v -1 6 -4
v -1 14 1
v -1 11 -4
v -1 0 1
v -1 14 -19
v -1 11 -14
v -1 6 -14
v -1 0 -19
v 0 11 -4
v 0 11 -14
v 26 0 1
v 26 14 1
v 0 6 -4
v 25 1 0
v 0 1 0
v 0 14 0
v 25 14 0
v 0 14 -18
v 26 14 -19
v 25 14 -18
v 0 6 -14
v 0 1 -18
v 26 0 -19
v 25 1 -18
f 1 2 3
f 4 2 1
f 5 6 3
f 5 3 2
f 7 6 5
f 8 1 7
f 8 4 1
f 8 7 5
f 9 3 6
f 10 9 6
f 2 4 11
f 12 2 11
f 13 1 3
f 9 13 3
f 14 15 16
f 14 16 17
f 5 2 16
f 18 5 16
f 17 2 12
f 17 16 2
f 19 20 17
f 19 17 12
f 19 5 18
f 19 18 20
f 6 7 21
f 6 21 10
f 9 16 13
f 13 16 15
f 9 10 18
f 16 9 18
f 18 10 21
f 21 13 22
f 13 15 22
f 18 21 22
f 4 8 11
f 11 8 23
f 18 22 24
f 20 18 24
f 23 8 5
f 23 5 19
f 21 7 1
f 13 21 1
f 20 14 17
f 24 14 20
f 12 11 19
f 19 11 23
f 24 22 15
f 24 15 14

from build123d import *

# Parameters (mm, degrees)
CROQUIS1_W              = 27
CROQUIS1_H              = 20
CROQUIS1_W_2            = 25
CROQUIS1_H_2            = 18
SALIENTE_EXTRUIR1_DEPTH = 14
CROQUIS1_3_W            = 25
CROQUIS1_3_H            = 18
SALIENTE_EXTRUIR2_DEPTH = 1
CROQUIS2_W              = 10
CROQUIS2_H              = 5
CORTAR_EXTRUIR1_DEPTH   = 1


with BuildPart() as part:
    # Croquis1 → Saliente-Extruir1 (new body)
    with BuildSketch(Plane(origin=(0, 0, 0), x_dir=(1, 0, 0), z_dir=(0, 1, 0))):
        with Locations((12.5, 9)):
            Rectangle(CROQUIS1_W, CROQUIS1_H)
        with Locations((12.5, 9)):
            Rectangle(CROQUIS1_W_2, CROQUIS1_H_2, mode=Mode.SUBTRACT)
    extrude(amount=SALIENTE_EXTRUIR1_DEPTH)

    # Croquis1<3> → Saliente-Extruir2 (add)
    with BuildSketch(Plane(origin=(0, 0, 0), x_dir=(1, 0, 0), z_dir=(0, 1, 0))):
        with Locations((12.5, 9)):
            Rectangle(CROQUIS1_3_W, CROQUIS1_3_H)
    extrude(amount=SALIENTE_EXTRUIR2_DEPTH)

    # Croquis2 → Cortar-Extruir1 (cut)
    with BuildSketch(Plane.ZY.offset(1)):
        with Locations((-9, 8.5)):
            Rectangle(CROQUIS2_W, CROQUIS2_H)
    extrude(amount=-CORTAR_EXTRUIR1_DEPTH, mode=Mode.SUBTRACT)


solid = part.part
